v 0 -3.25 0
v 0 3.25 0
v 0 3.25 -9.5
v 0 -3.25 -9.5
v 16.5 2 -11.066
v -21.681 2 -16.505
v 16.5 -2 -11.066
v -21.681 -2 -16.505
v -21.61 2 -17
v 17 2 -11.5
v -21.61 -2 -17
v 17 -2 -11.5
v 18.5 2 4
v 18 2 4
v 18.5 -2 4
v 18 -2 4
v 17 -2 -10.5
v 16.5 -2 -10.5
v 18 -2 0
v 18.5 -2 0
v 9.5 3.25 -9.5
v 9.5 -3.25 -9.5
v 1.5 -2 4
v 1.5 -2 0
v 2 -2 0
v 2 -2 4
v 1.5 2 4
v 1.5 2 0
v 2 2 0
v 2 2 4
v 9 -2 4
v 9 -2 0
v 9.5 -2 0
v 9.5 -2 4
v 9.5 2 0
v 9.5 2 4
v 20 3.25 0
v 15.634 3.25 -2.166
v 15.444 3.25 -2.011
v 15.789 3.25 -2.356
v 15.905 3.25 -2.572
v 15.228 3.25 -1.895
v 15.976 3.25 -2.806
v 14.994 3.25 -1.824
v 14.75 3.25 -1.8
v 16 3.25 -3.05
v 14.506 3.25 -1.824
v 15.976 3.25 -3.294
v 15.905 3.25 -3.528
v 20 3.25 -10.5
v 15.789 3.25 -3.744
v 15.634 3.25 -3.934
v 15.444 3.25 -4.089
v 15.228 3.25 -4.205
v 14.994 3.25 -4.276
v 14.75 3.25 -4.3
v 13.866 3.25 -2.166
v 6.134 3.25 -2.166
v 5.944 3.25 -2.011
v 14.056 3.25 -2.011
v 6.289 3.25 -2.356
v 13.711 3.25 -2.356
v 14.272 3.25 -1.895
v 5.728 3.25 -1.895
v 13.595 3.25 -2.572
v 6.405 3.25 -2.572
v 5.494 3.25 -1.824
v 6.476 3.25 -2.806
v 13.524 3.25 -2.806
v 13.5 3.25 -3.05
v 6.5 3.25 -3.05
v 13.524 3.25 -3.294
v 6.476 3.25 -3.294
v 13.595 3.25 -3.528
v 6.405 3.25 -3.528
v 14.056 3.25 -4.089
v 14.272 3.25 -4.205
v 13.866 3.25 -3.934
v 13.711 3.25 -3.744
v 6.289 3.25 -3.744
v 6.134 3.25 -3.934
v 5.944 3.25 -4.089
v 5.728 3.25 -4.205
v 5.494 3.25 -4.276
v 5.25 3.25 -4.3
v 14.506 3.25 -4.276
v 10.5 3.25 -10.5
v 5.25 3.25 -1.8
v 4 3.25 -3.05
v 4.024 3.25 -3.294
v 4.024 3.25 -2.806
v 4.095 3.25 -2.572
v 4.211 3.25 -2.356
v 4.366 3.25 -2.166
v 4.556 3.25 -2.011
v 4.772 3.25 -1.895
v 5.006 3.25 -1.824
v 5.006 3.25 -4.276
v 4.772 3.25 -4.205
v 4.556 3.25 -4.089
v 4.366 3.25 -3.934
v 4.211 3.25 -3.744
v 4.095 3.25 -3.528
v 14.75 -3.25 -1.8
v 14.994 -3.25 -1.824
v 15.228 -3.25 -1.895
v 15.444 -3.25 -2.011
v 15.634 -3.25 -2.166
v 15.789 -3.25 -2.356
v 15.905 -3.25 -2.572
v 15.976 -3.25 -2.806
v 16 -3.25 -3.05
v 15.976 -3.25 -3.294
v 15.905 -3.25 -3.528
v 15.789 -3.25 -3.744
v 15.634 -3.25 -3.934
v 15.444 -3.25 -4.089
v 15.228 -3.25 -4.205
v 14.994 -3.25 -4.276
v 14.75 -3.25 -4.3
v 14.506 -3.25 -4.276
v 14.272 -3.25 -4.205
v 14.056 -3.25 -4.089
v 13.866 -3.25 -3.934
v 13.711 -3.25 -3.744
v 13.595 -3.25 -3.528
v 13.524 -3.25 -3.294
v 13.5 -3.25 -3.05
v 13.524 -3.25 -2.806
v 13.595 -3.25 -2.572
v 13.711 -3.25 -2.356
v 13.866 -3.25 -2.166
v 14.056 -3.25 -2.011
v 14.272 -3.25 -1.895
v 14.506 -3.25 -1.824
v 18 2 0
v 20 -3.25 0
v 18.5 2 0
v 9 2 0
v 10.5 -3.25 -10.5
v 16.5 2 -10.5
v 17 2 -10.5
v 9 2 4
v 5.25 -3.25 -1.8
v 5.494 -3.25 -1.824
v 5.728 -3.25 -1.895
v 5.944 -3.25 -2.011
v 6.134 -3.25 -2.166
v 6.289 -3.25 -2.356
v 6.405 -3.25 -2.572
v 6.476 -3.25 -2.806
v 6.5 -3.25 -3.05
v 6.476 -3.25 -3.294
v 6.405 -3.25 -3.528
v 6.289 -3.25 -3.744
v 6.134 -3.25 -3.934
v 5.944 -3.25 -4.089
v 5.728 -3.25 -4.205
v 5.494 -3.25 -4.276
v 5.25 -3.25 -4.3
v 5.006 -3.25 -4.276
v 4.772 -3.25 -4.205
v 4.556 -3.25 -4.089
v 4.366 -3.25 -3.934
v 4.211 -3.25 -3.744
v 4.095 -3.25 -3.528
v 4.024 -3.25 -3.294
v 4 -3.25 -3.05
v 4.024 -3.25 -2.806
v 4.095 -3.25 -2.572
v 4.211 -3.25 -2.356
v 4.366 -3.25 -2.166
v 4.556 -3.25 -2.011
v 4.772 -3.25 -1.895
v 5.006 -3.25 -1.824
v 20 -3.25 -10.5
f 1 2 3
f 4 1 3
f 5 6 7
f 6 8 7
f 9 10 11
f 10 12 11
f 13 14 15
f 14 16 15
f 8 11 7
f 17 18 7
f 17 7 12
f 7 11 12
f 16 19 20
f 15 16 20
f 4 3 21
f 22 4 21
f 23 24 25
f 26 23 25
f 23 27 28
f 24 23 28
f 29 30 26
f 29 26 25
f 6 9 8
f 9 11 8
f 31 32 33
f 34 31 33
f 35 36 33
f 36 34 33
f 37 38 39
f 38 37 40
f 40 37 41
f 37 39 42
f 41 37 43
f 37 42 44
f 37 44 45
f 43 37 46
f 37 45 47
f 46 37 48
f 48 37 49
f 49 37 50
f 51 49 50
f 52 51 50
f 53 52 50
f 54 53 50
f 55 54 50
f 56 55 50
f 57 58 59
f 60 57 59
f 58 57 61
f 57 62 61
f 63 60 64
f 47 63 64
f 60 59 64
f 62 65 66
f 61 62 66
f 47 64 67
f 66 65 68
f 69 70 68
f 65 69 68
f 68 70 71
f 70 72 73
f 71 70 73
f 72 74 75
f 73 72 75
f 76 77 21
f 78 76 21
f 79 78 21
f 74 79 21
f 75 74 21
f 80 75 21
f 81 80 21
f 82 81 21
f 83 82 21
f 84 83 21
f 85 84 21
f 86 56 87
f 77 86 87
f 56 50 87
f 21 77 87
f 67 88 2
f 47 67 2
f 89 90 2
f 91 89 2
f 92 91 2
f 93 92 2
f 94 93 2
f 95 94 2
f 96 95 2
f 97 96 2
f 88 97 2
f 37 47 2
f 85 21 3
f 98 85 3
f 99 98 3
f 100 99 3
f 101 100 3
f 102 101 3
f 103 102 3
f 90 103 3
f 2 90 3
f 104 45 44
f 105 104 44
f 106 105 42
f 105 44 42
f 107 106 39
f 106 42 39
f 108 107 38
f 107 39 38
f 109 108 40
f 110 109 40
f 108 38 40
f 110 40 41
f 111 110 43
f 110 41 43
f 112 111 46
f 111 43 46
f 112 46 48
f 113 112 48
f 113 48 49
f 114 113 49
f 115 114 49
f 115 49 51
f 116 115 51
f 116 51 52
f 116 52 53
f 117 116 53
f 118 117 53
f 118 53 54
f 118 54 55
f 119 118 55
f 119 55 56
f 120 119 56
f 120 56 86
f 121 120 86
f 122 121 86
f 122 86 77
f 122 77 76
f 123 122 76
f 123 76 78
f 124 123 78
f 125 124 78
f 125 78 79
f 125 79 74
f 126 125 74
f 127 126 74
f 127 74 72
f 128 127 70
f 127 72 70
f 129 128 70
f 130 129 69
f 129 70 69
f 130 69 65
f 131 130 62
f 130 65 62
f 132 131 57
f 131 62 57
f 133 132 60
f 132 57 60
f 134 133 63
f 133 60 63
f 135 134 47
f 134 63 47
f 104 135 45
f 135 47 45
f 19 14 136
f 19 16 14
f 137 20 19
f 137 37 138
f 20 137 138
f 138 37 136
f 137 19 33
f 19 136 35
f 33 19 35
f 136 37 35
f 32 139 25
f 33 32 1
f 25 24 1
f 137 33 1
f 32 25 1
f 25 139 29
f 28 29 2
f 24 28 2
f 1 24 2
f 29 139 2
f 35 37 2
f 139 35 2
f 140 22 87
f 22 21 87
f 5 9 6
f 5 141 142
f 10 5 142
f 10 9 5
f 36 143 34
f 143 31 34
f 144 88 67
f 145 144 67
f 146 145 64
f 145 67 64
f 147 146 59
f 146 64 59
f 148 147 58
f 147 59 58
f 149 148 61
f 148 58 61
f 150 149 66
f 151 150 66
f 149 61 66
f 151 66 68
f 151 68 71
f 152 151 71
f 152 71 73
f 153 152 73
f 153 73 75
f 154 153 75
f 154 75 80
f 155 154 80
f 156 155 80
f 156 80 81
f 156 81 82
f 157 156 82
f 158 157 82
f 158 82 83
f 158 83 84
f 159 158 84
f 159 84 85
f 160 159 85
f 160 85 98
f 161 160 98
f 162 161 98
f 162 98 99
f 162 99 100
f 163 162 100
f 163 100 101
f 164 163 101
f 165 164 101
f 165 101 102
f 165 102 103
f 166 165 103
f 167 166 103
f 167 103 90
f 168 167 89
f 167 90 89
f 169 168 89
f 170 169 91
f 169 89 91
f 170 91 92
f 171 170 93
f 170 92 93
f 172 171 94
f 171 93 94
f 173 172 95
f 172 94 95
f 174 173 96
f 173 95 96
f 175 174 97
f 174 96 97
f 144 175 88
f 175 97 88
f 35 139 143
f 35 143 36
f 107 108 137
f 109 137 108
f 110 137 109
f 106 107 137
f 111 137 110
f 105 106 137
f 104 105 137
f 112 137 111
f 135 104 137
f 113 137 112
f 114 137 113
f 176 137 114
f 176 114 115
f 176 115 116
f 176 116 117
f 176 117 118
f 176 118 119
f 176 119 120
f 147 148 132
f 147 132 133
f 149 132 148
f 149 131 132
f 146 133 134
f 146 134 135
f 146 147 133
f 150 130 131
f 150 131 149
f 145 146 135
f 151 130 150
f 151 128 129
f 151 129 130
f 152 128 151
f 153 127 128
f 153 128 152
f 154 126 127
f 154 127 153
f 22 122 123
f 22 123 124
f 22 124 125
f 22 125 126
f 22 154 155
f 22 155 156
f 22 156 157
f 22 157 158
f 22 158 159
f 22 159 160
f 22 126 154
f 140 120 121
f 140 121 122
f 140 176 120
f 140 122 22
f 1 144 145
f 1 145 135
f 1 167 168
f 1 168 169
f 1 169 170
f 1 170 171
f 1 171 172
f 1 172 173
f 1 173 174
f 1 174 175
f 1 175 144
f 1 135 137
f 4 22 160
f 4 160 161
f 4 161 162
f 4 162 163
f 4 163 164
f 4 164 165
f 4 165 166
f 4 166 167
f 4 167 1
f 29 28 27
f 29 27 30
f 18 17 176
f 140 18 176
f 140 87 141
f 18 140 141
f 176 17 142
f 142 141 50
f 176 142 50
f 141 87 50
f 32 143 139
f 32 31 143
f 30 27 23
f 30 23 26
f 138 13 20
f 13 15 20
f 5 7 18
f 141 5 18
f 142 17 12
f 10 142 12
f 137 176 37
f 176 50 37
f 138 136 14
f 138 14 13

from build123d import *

# Parameters (mm, degrees)
BOSS_EXTRUDE1_DEPTH = 3.25
SKETCH2_W           = 0.5
SKETCH2_H           = 4
BOSS_EXTRUDE2_DEPTH = 2
SKETCH3_R           = 1.25
CUT_EXTRUDE1_DEPTH  = 14


with BuildPart() as part:
    # Sketch1 → Boss-Extrude1 (new, symmetric)
    with BuildSketch(Plane(origin=(0, 0, 0), x_dir=(1, 0, 0), z_dir=(0, 1, 0))):
        Polygon((0, 9.5), (9.5, 9.5), (10.5, 10.5), (20, 10.5), (20, 0), (0, 0), align=None)
    extrude(amount=BOSS_EXTRUDE1_DEPTH, both=True)

    # Sketch2 → Boss-Extrude2 (add, symmetric)
    with BuildSketch(Plane(origin=(0, 0, 0), x_dir=(1, 0, 0), z_dir=(0, 1, 0))):
        Polygon((17, 10.5), (17, 11.5), (-21.610231805, 17), (-21.680744625, 16.504997028), (16.5, 11.066177171), (16.5, 10.5), align=None)
        with Locations((18.25, -2)):
            Rectangle(SKETCH2_W, SKETCH2_H)
        with Locations((9.25, -2)):
            Rectangle(SKETCH2_W, SKETCH2_H)
        with Locations((1.75, -2)):
            Rectangle(SKETCH2_W, SKETCH2_H)
    extrude(amount=BOSS_EXTRUDE2_DEPTH, both=True)

    # Sketch3 → Cut-Extrude1 (cut)
    with BuildSketch(Plane(origin=(0, 3.25, 0), x_dir=(1, 0, 0), z_dir=(0, 1, 0))):
        with Locations(Location((5.25, 3.05, 0), (0, 0, 270))):
            Circle(SKETCH3_R)
        with Locations(Location((14.75, 3.05, 0), (0, 0, 270))):
            Circle(SKETCH3_R)
    extrude(amount=-CUT_EXTRUDE1_DEPTH, mode=Mode.SUBTRACT)


solid = part.part
